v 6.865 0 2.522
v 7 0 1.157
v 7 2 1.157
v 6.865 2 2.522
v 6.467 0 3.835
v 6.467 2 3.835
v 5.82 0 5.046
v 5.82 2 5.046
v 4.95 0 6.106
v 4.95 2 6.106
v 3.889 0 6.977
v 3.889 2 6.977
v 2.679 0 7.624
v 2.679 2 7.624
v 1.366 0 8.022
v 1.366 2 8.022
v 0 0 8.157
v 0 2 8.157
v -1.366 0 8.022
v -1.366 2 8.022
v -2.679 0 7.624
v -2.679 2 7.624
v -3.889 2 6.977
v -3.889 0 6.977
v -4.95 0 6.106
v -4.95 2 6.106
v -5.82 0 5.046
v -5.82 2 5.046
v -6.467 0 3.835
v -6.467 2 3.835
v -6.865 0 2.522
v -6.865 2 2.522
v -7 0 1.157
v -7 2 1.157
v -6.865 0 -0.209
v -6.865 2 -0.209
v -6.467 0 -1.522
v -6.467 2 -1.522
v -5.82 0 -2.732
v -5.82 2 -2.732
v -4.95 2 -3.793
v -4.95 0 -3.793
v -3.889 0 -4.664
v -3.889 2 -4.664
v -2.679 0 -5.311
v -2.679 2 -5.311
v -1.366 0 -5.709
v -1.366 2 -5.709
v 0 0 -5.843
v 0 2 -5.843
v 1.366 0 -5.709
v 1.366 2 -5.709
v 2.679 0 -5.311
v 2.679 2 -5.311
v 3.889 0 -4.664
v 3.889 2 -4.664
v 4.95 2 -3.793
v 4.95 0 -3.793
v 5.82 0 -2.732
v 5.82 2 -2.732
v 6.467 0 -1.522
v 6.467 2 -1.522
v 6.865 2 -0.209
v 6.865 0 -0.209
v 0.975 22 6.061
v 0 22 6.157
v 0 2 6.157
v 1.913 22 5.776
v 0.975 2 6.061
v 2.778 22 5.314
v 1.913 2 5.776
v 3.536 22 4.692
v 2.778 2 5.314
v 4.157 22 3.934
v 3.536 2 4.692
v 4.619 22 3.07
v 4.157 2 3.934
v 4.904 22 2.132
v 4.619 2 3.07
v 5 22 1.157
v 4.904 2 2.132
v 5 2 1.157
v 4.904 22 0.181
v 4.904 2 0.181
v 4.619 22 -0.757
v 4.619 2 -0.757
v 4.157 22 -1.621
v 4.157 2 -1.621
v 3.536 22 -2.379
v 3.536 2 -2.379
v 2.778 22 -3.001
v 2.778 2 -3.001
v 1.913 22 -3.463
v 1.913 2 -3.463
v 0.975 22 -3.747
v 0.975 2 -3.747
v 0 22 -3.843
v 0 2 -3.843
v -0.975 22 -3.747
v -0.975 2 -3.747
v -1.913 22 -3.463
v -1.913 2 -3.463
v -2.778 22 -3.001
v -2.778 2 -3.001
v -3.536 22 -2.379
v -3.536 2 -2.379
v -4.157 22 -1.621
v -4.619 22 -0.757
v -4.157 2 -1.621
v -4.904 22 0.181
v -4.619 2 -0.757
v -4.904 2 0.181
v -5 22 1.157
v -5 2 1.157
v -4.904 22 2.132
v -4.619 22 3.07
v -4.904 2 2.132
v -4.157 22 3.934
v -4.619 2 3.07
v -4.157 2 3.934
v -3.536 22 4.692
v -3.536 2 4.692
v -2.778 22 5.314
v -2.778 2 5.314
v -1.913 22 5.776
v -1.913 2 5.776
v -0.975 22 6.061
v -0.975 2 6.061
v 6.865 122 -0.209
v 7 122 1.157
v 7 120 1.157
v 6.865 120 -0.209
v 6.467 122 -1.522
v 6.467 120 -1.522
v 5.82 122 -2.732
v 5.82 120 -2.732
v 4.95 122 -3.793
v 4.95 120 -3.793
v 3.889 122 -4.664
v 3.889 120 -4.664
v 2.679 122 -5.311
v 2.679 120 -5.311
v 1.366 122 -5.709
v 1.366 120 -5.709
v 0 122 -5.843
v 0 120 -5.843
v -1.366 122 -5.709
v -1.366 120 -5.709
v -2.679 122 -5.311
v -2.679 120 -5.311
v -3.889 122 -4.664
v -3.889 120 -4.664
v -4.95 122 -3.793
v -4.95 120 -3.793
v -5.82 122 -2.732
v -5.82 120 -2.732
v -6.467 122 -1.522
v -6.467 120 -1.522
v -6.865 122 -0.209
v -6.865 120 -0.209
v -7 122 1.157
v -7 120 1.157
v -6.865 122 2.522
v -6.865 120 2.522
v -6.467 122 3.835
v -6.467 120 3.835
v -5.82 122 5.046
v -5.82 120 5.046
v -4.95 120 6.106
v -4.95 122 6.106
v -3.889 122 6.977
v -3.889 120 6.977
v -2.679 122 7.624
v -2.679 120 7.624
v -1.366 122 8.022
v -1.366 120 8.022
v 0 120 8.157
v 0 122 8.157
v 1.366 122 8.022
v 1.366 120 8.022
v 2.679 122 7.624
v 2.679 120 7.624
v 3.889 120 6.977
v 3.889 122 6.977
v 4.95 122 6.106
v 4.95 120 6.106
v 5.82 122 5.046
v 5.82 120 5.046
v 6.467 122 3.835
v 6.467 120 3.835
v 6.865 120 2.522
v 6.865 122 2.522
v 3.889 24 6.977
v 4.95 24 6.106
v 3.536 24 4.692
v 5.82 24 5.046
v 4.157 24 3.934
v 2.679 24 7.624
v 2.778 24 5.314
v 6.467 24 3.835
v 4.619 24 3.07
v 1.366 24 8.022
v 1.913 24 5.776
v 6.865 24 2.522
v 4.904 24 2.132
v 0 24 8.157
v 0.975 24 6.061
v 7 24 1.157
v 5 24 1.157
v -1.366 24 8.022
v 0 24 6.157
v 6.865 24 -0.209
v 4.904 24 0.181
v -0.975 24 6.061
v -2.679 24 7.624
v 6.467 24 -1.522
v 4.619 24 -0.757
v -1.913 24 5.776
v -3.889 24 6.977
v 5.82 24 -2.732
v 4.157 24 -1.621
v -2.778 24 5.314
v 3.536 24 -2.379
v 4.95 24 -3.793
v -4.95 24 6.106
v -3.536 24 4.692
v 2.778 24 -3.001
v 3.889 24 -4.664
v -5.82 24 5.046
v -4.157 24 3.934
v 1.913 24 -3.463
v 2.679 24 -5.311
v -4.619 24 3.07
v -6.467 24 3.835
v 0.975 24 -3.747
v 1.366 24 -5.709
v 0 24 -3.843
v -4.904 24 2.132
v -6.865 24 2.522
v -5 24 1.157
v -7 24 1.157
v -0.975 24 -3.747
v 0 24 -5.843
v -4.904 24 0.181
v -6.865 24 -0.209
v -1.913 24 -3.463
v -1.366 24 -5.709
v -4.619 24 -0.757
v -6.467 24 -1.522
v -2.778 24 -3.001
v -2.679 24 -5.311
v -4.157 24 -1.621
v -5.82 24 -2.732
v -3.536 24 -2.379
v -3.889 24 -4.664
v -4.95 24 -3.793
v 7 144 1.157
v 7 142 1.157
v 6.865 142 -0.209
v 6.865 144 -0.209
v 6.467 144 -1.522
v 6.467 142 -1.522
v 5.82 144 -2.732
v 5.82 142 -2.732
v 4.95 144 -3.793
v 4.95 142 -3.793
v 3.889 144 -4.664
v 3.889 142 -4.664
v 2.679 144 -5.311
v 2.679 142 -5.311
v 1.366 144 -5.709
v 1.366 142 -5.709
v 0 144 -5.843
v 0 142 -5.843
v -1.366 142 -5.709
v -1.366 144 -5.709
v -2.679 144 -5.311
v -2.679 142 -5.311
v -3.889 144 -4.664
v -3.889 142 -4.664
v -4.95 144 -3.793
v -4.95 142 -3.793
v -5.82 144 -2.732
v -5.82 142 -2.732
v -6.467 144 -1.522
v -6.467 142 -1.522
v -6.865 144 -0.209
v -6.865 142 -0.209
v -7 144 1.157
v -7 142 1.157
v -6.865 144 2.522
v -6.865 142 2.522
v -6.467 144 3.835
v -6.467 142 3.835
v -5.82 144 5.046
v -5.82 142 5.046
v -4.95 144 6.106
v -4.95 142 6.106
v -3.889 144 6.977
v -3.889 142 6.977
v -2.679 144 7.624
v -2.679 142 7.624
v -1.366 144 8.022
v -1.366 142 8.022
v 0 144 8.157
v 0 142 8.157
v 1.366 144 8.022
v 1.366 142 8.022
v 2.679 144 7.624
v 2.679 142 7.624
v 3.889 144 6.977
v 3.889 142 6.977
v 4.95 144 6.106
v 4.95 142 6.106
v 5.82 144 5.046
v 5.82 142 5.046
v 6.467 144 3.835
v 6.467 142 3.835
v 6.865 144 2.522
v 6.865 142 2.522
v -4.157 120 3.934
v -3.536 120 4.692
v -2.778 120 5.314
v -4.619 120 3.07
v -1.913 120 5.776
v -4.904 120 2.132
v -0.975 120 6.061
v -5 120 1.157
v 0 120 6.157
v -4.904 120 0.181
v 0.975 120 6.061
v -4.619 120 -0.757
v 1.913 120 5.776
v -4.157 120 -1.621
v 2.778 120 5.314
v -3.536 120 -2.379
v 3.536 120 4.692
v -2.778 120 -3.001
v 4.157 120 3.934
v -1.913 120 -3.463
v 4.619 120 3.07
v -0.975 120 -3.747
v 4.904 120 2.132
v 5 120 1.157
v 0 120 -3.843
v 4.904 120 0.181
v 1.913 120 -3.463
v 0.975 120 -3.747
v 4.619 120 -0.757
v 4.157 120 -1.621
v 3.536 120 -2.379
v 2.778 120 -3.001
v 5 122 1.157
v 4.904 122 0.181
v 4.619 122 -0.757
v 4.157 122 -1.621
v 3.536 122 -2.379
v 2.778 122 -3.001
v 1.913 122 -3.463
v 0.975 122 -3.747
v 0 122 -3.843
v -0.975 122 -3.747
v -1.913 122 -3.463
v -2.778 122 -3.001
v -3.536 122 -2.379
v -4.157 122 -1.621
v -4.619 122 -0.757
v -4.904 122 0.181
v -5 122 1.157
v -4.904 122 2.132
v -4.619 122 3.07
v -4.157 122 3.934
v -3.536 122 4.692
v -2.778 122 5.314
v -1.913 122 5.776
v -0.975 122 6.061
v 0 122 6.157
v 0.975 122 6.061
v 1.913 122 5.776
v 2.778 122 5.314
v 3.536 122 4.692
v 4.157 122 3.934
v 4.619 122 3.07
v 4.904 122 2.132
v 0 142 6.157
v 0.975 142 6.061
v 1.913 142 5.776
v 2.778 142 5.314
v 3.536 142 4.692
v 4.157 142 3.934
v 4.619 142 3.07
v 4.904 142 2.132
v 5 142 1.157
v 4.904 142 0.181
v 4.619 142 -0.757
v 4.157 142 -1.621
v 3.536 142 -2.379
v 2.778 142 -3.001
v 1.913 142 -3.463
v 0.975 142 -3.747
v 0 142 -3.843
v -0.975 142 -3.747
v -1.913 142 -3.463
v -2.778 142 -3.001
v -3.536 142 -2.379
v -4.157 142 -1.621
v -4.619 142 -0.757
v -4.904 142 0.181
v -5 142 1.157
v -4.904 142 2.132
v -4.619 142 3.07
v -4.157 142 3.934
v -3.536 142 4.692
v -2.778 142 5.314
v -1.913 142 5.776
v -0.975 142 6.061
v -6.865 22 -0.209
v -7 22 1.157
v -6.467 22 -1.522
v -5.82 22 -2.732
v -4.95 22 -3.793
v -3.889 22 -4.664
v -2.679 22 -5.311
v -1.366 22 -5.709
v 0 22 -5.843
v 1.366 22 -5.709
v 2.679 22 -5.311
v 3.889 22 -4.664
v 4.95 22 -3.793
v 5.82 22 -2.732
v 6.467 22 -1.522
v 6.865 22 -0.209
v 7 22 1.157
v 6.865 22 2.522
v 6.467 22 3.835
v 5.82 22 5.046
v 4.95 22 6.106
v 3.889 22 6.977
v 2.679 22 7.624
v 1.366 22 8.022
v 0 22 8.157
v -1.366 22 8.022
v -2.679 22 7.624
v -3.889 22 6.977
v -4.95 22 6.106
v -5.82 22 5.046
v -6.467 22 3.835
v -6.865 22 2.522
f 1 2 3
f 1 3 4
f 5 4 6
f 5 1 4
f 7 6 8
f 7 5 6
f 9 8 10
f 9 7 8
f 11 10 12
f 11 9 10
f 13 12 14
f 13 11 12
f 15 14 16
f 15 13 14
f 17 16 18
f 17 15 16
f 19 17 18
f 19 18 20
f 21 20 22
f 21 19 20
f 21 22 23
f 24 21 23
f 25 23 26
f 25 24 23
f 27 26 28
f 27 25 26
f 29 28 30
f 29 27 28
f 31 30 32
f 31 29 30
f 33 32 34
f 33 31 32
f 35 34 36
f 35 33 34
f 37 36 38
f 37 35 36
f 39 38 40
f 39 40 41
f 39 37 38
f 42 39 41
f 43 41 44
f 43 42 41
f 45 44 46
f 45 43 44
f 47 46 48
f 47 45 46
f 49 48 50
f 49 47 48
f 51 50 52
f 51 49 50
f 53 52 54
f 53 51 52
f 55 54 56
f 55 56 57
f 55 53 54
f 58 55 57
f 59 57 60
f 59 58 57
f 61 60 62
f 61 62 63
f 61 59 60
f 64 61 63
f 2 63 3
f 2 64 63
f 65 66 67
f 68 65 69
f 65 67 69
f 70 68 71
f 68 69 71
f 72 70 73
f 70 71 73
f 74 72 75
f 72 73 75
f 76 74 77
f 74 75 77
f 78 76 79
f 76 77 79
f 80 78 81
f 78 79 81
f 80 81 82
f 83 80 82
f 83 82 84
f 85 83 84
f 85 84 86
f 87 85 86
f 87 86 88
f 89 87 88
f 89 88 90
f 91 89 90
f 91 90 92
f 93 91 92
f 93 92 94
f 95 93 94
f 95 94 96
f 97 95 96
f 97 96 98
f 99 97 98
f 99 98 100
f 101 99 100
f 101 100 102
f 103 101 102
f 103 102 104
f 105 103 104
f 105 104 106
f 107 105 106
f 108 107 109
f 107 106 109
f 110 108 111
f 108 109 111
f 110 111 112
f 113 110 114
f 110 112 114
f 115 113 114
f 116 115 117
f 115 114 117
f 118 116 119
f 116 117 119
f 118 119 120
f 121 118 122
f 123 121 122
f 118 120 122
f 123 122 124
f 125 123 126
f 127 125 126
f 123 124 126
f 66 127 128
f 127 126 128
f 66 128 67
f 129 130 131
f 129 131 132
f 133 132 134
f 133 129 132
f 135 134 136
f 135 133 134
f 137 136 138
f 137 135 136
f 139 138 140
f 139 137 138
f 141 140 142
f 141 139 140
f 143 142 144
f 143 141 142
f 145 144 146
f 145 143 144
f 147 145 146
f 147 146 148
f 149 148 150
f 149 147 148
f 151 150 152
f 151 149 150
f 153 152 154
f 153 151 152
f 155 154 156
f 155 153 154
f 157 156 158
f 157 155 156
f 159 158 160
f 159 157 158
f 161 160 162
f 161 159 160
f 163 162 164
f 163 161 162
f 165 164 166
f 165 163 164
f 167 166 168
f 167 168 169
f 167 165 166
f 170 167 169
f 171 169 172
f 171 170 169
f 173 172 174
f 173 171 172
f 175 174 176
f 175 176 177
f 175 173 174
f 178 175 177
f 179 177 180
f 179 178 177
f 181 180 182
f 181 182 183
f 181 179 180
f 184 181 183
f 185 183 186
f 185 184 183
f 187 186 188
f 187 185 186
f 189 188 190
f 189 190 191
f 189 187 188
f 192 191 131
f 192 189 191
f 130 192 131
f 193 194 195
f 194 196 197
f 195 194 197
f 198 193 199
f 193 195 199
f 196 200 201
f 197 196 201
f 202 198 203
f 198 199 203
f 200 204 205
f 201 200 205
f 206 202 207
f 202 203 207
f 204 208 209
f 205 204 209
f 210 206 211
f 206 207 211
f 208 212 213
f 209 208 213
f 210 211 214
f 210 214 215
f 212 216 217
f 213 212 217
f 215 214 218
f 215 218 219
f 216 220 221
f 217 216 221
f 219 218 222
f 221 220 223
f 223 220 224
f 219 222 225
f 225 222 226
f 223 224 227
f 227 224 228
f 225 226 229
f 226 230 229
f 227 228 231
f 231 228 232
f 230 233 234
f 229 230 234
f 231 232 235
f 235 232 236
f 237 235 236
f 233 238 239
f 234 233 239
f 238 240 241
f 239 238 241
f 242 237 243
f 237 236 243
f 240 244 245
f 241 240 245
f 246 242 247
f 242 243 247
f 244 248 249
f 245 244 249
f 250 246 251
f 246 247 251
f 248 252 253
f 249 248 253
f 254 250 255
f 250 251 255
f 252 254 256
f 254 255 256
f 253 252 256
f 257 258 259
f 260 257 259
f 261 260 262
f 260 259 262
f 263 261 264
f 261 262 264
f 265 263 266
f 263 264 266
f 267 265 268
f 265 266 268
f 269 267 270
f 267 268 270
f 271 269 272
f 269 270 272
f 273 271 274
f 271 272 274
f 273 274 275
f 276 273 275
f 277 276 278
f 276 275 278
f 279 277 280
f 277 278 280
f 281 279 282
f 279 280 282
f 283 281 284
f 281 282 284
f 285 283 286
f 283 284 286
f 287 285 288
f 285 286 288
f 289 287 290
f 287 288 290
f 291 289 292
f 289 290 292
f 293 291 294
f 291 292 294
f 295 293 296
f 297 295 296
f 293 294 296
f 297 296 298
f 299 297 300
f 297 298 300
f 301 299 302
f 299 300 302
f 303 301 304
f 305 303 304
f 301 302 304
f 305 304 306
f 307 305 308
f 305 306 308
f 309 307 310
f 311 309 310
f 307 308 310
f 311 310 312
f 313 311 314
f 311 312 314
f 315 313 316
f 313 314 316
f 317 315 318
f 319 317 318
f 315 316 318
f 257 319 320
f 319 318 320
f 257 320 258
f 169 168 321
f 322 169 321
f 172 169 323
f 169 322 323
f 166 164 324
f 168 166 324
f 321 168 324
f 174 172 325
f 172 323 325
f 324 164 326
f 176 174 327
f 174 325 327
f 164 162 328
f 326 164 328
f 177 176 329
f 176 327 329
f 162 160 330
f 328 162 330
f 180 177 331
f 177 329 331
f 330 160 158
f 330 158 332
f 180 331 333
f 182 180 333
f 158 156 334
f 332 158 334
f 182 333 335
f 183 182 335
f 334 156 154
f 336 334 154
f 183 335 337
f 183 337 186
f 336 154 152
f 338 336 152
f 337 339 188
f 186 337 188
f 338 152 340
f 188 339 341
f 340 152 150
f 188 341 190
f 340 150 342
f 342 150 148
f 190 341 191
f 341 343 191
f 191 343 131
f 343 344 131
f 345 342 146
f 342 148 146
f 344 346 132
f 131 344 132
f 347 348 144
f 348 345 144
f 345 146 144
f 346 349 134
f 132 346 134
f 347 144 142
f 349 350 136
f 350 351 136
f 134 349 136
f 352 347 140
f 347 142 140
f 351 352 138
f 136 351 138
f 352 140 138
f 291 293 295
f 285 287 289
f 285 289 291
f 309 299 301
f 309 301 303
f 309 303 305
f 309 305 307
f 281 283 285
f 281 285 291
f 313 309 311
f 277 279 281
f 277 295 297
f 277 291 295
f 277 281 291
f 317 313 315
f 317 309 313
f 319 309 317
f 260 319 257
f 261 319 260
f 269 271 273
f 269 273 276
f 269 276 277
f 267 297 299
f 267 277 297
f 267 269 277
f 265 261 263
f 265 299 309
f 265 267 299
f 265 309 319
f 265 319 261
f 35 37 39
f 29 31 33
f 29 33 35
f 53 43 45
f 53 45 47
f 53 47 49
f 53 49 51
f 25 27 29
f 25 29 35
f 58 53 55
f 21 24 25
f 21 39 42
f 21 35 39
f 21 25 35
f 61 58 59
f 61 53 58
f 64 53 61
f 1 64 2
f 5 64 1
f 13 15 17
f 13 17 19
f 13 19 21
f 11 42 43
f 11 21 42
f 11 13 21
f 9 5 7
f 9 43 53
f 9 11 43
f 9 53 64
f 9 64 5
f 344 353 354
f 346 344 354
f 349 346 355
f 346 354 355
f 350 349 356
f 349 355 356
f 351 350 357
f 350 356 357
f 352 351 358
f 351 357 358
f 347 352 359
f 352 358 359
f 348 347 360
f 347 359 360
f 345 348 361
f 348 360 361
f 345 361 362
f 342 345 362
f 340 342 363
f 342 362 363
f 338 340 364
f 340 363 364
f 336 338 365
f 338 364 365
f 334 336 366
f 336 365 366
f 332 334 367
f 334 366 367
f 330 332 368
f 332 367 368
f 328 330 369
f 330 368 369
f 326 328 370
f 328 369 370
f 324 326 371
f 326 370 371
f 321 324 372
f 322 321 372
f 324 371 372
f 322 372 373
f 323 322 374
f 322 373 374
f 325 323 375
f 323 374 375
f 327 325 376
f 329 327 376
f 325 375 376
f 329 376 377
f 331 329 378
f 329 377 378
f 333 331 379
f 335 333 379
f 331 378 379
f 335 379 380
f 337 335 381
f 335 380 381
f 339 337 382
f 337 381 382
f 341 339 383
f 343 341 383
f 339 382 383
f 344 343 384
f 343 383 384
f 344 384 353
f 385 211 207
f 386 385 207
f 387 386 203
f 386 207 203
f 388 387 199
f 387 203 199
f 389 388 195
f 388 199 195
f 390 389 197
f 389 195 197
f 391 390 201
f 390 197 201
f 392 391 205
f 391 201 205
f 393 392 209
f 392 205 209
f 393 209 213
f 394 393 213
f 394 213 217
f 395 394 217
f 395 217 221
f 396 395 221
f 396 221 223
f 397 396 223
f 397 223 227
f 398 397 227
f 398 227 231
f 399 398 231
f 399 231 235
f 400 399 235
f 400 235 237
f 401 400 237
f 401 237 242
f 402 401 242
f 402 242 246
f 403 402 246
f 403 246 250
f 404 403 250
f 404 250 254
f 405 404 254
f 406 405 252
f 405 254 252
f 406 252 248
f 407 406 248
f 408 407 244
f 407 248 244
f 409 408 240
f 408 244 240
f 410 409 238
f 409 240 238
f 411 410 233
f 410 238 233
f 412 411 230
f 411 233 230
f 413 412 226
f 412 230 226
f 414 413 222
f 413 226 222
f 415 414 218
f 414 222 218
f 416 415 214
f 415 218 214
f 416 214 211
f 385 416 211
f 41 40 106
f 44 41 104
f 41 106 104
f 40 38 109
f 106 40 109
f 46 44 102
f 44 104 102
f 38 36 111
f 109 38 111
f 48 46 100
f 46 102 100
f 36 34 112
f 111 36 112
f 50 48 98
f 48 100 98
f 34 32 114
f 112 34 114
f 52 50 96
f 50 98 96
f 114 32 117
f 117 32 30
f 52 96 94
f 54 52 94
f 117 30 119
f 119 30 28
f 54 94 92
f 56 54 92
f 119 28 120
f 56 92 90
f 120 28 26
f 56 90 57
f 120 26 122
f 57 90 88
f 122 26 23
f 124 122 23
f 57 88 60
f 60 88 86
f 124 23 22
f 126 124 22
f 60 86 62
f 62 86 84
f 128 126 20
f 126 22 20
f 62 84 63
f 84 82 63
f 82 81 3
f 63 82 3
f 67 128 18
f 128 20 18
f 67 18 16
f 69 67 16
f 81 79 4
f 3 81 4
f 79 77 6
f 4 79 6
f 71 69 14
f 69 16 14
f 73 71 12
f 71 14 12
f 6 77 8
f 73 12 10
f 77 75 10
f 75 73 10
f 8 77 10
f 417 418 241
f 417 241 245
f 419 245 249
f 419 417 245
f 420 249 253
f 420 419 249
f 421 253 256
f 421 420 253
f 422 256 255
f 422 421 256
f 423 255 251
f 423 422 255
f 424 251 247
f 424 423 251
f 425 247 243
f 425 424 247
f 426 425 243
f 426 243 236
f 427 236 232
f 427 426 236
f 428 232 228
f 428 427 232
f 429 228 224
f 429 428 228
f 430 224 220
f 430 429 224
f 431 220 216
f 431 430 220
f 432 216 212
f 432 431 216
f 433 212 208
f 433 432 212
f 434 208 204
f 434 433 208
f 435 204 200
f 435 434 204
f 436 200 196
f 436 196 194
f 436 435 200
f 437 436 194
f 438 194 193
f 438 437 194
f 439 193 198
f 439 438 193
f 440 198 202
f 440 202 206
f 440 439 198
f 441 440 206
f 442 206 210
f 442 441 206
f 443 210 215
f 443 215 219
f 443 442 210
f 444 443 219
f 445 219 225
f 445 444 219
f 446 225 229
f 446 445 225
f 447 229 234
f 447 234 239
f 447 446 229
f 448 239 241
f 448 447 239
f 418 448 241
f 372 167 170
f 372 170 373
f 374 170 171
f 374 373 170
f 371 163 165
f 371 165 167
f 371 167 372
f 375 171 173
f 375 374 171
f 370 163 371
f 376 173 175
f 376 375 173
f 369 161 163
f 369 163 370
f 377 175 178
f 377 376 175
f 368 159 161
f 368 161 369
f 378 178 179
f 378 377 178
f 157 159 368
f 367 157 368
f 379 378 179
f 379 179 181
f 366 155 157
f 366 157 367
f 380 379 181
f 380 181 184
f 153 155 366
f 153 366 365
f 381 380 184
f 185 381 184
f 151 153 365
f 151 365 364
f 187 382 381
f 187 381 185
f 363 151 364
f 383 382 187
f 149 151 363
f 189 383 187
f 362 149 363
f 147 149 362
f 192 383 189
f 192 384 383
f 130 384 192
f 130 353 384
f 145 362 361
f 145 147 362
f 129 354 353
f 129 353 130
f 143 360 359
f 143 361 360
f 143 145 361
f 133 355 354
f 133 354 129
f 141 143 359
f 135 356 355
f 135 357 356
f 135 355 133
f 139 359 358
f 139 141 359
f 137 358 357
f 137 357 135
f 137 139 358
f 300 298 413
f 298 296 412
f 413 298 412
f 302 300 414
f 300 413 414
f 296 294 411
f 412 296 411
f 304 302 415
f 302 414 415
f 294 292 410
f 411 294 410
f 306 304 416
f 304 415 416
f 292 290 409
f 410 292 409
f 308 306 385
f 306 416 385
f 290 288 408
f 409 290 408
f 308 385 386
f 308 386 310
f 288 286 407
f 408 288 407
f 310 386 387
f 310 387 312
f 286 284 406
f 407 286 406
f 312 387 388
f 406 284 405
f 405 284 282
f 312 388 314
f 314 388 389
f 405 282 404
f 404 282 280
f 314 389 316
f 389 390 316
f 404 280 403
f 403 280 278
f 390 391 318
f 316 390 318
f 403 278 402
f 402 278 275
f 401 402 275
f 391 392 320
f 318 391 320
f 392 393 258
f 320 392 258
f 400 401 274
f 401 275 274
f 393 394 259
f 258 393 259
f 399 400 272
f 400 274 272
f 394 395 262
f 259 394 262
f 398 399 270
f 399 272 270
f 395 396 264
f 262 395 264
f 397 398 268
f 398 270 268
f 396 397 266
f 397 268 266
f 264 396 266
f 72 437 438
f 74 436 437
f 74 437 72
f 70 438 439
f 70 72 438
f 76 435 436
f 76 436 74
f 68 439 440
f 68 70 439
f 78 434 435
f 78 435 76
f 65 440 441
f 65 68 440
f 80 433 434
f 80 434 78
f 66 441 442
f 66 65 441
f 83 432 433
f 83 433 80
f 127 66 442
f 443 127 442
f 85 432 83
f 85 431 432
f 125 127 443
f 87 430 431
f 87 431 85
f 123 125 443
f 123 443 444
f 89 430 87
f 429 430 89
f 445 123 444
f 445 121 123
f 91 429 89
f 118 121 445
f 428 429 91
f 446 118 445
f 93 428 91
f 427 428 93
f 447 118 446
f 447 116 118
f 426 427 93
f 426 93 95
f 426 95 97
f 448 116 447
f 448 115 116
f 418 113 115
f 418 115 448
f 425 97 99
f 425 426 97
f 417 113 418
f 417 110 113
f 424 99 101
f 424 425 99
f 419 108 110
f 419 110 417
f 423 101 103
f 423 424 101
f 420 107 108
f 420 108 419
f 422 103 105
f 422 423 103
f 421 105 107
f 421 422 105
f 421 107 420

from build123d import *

# Parameters (mm, degrees)
SKETCH_1_R        = 5
EXTRUDE_1_DEPTH   = 144
EXTRUDE_START     = -2
SKETCH_4_R        = 7
SKETCH_4_R_2      = 5
EXTRUDE_1_2_DEPTH = 2
SKETCH_5_R        = 7
SKETCH_5_R_2      = 5
EXTRUDE_2_DEPTH   = 2
EXTRUDE_START_2   = -22
SKETCH_6_R        = 7
SKETCH_6_R_2      = 5
EXTRUDE_3_DEPTH   = 2
SKETCH_7_R        = 7
SKETCH_7_R_2      = 5
EXTRUDE_4_DEPTH   = 2


with BuildPart() as part:
    # 草图1 → Extrude 1 (new body)
    with BuildSketch(Plane(origin=(0, 0, 0), x_dir=(1, 0, 0), z_dir=(0, 1, 0))):
        with Locations(Location((0, -1.156601006, 0), (0, 0, 270))):
            Circle(SKETCH_1_R)
    extrude(amount=EXTRUDE_1_DEPTH)

    # 草图4 → Extrude 1 2 (add)
    with BuildSketch(Plane(origin=(0, 144, 0), x_dir=(1, 0, 0), z_dir=(0, 1, 0)).offset(EXTRUDE_START)):
        with Locations((0, -1.156601006)):
            Circle(SKETCH_4_R)
        with Locations((0, -1.156601006)):
            Circle(SKETCH_4_R_2, mode=Mode.SUBTRACT)
    extrude(amount=EXTRUDE_1_2_DEPTH)

    # 草图5 → 拉伸-薄壁2 (add)
    with BuildSketch(Plane.XZ):
        with Locations((0, 1.156601006)):
            Circle(SKETCH_5_R)
        with Locations((0, 1.156601006)):
            Circle(SKETCH_5_R_2, mode=Mode.SUBTRACT)
    extrude(amount=-EXTRUDE_2_DEPTH)

    # 草图7 → 拉伸-薄壁4 (add)
    with BuildSketch(Plane(origin=(0, 0, 0), x_dir=(-1, 0, 0), z_dir=(0, -1, 0)).offset(EXTRUDE_START_2)):
        with Locations((0, -1.156601006)):
            Circle(SKETCH_7_R)
        with Locations((0, -1.156601006)):
            Circle(SKETCH_7_R_2, mode=Mode.SUBTRACT)
    extrude(amount=-EXTRUDE_4_DEPTH)


with BuildPart() as body_2:
    # 草图6 → 拉伸-薄壁3 (new body)
    with BuildSketch(Plane(origin=(0, 144, 0), x_dir=(1, 0, 0), z_dir=(0, 1, 0)).offset(EXTRUDE_START_2)):
        with Locations((0, -1.156601006)):
            Circle(SKETCH_6_R)
        with Locations((0, -1.156601006)):
            Circle(SKETCH_6_R_2, mode=Mode.SUBTRACT)
    extrude(amount=-EXTRUDE_3_DEPTH)


solid = Compound([part.part, body_2.part])
